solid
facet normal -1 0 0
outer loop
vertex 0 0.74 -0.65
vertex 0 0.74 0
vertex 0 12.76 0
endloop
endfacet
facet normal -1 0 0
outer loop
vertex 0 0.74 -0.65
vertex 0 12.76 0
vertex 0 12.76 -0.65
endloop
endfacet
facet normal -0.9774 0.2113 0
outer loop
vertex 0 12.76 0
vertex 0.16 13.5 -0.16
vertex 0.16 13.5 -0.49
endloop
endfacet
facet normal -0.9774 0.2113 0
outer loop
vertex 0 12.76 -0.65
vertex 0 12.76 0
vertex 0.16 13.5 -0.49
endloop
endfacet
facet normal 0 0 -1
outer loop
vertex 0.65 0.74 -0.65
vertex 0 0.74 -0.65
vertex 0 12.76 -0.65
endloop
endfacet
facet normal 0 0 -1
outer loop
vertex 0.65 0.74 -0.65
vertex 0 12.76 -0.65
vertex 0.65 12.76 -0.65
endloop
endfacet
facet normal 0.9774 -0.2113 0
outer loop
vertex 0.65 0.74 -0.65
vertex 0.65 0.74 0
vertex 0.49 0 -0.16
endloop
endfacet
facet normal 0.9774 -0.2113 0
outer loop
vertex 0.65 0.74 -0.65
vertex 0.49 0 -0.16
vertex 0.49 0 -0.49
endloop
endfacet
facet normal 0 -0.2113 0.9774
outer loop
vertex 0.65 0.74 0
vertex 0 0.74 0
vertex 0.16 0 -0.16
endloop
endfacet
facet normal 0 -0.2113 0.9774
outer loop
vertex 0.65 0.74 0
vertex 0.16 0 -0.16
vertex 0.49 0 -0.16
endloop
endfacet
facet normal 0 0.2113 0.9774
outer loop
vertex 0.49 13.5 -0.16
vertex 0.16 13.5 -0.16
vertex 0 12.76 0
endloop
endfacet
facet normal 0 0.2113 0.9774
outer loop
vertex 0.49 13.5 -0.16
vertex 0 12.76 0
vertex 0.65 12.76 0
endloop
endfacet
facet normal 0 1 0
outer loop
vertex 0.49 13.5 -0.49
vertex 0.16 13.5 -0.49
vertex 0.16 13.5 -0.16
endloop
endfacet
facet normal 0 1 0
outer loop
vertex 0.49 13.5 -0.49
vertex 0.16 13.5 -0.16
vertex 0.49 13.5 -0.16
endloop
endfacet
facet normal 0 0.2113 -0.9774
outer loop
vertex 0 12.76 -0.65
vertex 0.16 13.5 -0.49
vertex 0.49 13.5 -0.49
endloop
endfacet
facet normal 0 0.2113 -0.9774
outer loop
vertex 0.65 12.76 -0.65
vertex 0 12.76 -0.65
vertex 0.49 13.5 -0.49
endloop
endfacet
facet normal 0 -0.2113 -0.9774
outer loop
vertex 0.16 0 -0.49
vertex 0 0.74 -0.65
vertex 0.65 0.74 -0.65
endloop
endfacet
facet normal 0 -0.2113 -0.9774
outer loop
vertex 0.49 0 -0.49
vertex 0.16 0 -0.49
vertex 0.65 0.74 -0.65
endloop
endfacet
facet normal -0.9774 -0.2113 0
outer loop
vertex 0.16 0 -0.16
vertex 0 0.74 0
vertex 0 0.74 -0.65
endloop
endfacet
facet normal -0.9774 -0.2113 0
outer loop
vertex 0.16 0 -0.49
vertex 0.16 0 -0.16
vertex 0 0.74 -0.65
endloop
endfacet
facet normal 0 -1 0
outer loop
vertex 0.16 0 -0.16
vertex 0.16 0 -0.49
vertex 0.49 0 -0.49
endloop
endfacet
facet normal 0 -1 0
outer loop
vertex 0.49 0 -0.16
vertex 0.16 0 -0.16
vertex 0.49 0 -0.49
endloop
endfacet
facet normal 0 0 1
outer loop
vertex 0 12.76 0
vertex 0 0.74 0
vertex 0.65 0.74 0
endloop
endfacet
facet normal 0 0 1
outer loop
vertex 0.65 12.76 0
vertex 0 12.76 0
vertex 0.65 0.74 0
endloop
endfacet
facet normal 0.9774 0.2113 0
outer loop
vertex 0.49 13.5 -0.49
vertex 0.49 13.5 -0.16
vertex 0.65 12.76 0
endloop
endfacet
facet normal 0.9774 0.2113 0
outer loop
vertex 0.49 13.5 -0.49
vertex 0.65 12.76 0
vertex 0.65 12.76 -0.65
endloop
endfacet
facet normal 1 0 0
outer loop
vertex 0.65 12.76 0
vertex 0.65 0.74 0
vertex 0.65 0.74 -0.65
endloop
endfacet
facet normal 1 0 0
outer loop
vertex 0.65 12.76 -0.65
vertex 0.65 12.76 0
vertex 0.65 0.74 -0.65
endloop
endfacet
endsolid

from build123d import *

# Parameters (mm, degrees)
SKETCH1_W             = 0.65
SKETCH1_H             = 0.65
BOSS_EXTRUDE1_DEPTH   = 13.5
CHAMFER1_SIZE         = 0.74
CHAMFER1_SIZE2        = 0.16
CHAMFER1_PART_2_SIZE  = 0.74
CHAMFER1_PART_2_SIZE2 = 0.16
CHAMFER1_PART_3_SIZE  = 0.74
CHAMFER1_PART_3_SIZE2 = 0.16
CHAMFER1_PART_4_SIZE  = 0.74
CHAMFER1_PART_4_SIZE2 = 0.16
CHAMFER2_SIZE         = 0.16
CHAMFER2_SIZE2        = 0.74


with BuildPart() as part:
    # Sketch1 → Boss-Extrude1 (new body)
    with BuildSketch(Plane(origin=(0, 0, 0), x_dir=(1, 0, 0), z_dir=(0, 1, 0))):
        with Locations((0.325, 0.325)):
            Rectangle(SKETCH1_W, SKETCH1_H)
    extrude(amount=BOSS_EXTRUDE1_DEPTH)

    # Chamfer1
    chamfer1_edges = [part.edges().sort_by_distance(p)[0] for p in [
        (0.65, 13.5, -0.325),
    ]]
    chamfer1_side = [part.faces().sort_by_distance(p)[0] for p in [
        (0.65, 6.75, -0.325),
    ]]
    chamfer(chamfer1_edges, length=CHAMFER1_SIZE, length2=CHAMFER1_SIZE2, reference=chamfer1_side[0])

    # Chamfer1 part 2
    chamfer1_part_2_edges = [part.edges().sort_by_distance(p)[0] for p in [
        (0.325, 13.5, -0.65),
    ]]
    chamfer1_part_2_side = [part.faces().sort_by_distance(p)[0] for p in [
        (0.325, 6.75, -0.65),
    ]]
    chamfer(chamfer1_part_2_edges, length=CHAMFER1_PART_2_SIZE, length2=CHAMFER1_PART_2_SIZE2, reference=chamfer1_part_2_side[0])

    # Chamfer1 part 3
    chamfer1_part_3_edges = [part.edges().sort_by_distance(p)[0] for p in [
        (0, 13.5, -0.325),
    ]]
    chamfer1_part_3_side = [part.faces().sort_by_distance(p)[0] for p in [
        (0, 6.75, -0.325),
    ]]
    chamfer(chamfer1_part_3_edges, length=CHAMFER1_PART_3_SIZE, length2=CHAMFER1_PART_3_SIZE2, reference=chamfer1_part_3_side[0])

    # Chamfer1 part 4
    chamfer1_part_4_edges = [part.edges().sort_by_distance(p)[0] for p in [
        (0.325, 13.5, 0),
    ]]
    chamfer1_part_4_side = [part.faces().sort_by_distance(p)[0] for p in [
        (0.325, 6.75, 0),
    ]]
    chamfer(chamfer1_part_4_edges, length=CHAMFER1_PART_4_SIZE, length2=CHAMFER1_PART_4_SIZE2, reference=chamfer1_part_4_side[0])

    # Chamfer2
    chamfer2_edges = [part.edges().sort_by_distance(p)[0] for p in [
        (0.325, 0, -0.65),
        (0.65, 0, -0.325),
        (0.325, 0, 0),
        (0, 0, -0.325),
    ]]
    chamfer2_side = [part.faces().sort_by_distance(p)[0] for p in [
        (0.325, 0, -0.325),
    ]]
    chamfer(chamfer2_edges, length=CHAMFER2_SIZE, length2=CHAMFER2_SIZE2, reference=chamfer2_side[0])


solid = part.part
